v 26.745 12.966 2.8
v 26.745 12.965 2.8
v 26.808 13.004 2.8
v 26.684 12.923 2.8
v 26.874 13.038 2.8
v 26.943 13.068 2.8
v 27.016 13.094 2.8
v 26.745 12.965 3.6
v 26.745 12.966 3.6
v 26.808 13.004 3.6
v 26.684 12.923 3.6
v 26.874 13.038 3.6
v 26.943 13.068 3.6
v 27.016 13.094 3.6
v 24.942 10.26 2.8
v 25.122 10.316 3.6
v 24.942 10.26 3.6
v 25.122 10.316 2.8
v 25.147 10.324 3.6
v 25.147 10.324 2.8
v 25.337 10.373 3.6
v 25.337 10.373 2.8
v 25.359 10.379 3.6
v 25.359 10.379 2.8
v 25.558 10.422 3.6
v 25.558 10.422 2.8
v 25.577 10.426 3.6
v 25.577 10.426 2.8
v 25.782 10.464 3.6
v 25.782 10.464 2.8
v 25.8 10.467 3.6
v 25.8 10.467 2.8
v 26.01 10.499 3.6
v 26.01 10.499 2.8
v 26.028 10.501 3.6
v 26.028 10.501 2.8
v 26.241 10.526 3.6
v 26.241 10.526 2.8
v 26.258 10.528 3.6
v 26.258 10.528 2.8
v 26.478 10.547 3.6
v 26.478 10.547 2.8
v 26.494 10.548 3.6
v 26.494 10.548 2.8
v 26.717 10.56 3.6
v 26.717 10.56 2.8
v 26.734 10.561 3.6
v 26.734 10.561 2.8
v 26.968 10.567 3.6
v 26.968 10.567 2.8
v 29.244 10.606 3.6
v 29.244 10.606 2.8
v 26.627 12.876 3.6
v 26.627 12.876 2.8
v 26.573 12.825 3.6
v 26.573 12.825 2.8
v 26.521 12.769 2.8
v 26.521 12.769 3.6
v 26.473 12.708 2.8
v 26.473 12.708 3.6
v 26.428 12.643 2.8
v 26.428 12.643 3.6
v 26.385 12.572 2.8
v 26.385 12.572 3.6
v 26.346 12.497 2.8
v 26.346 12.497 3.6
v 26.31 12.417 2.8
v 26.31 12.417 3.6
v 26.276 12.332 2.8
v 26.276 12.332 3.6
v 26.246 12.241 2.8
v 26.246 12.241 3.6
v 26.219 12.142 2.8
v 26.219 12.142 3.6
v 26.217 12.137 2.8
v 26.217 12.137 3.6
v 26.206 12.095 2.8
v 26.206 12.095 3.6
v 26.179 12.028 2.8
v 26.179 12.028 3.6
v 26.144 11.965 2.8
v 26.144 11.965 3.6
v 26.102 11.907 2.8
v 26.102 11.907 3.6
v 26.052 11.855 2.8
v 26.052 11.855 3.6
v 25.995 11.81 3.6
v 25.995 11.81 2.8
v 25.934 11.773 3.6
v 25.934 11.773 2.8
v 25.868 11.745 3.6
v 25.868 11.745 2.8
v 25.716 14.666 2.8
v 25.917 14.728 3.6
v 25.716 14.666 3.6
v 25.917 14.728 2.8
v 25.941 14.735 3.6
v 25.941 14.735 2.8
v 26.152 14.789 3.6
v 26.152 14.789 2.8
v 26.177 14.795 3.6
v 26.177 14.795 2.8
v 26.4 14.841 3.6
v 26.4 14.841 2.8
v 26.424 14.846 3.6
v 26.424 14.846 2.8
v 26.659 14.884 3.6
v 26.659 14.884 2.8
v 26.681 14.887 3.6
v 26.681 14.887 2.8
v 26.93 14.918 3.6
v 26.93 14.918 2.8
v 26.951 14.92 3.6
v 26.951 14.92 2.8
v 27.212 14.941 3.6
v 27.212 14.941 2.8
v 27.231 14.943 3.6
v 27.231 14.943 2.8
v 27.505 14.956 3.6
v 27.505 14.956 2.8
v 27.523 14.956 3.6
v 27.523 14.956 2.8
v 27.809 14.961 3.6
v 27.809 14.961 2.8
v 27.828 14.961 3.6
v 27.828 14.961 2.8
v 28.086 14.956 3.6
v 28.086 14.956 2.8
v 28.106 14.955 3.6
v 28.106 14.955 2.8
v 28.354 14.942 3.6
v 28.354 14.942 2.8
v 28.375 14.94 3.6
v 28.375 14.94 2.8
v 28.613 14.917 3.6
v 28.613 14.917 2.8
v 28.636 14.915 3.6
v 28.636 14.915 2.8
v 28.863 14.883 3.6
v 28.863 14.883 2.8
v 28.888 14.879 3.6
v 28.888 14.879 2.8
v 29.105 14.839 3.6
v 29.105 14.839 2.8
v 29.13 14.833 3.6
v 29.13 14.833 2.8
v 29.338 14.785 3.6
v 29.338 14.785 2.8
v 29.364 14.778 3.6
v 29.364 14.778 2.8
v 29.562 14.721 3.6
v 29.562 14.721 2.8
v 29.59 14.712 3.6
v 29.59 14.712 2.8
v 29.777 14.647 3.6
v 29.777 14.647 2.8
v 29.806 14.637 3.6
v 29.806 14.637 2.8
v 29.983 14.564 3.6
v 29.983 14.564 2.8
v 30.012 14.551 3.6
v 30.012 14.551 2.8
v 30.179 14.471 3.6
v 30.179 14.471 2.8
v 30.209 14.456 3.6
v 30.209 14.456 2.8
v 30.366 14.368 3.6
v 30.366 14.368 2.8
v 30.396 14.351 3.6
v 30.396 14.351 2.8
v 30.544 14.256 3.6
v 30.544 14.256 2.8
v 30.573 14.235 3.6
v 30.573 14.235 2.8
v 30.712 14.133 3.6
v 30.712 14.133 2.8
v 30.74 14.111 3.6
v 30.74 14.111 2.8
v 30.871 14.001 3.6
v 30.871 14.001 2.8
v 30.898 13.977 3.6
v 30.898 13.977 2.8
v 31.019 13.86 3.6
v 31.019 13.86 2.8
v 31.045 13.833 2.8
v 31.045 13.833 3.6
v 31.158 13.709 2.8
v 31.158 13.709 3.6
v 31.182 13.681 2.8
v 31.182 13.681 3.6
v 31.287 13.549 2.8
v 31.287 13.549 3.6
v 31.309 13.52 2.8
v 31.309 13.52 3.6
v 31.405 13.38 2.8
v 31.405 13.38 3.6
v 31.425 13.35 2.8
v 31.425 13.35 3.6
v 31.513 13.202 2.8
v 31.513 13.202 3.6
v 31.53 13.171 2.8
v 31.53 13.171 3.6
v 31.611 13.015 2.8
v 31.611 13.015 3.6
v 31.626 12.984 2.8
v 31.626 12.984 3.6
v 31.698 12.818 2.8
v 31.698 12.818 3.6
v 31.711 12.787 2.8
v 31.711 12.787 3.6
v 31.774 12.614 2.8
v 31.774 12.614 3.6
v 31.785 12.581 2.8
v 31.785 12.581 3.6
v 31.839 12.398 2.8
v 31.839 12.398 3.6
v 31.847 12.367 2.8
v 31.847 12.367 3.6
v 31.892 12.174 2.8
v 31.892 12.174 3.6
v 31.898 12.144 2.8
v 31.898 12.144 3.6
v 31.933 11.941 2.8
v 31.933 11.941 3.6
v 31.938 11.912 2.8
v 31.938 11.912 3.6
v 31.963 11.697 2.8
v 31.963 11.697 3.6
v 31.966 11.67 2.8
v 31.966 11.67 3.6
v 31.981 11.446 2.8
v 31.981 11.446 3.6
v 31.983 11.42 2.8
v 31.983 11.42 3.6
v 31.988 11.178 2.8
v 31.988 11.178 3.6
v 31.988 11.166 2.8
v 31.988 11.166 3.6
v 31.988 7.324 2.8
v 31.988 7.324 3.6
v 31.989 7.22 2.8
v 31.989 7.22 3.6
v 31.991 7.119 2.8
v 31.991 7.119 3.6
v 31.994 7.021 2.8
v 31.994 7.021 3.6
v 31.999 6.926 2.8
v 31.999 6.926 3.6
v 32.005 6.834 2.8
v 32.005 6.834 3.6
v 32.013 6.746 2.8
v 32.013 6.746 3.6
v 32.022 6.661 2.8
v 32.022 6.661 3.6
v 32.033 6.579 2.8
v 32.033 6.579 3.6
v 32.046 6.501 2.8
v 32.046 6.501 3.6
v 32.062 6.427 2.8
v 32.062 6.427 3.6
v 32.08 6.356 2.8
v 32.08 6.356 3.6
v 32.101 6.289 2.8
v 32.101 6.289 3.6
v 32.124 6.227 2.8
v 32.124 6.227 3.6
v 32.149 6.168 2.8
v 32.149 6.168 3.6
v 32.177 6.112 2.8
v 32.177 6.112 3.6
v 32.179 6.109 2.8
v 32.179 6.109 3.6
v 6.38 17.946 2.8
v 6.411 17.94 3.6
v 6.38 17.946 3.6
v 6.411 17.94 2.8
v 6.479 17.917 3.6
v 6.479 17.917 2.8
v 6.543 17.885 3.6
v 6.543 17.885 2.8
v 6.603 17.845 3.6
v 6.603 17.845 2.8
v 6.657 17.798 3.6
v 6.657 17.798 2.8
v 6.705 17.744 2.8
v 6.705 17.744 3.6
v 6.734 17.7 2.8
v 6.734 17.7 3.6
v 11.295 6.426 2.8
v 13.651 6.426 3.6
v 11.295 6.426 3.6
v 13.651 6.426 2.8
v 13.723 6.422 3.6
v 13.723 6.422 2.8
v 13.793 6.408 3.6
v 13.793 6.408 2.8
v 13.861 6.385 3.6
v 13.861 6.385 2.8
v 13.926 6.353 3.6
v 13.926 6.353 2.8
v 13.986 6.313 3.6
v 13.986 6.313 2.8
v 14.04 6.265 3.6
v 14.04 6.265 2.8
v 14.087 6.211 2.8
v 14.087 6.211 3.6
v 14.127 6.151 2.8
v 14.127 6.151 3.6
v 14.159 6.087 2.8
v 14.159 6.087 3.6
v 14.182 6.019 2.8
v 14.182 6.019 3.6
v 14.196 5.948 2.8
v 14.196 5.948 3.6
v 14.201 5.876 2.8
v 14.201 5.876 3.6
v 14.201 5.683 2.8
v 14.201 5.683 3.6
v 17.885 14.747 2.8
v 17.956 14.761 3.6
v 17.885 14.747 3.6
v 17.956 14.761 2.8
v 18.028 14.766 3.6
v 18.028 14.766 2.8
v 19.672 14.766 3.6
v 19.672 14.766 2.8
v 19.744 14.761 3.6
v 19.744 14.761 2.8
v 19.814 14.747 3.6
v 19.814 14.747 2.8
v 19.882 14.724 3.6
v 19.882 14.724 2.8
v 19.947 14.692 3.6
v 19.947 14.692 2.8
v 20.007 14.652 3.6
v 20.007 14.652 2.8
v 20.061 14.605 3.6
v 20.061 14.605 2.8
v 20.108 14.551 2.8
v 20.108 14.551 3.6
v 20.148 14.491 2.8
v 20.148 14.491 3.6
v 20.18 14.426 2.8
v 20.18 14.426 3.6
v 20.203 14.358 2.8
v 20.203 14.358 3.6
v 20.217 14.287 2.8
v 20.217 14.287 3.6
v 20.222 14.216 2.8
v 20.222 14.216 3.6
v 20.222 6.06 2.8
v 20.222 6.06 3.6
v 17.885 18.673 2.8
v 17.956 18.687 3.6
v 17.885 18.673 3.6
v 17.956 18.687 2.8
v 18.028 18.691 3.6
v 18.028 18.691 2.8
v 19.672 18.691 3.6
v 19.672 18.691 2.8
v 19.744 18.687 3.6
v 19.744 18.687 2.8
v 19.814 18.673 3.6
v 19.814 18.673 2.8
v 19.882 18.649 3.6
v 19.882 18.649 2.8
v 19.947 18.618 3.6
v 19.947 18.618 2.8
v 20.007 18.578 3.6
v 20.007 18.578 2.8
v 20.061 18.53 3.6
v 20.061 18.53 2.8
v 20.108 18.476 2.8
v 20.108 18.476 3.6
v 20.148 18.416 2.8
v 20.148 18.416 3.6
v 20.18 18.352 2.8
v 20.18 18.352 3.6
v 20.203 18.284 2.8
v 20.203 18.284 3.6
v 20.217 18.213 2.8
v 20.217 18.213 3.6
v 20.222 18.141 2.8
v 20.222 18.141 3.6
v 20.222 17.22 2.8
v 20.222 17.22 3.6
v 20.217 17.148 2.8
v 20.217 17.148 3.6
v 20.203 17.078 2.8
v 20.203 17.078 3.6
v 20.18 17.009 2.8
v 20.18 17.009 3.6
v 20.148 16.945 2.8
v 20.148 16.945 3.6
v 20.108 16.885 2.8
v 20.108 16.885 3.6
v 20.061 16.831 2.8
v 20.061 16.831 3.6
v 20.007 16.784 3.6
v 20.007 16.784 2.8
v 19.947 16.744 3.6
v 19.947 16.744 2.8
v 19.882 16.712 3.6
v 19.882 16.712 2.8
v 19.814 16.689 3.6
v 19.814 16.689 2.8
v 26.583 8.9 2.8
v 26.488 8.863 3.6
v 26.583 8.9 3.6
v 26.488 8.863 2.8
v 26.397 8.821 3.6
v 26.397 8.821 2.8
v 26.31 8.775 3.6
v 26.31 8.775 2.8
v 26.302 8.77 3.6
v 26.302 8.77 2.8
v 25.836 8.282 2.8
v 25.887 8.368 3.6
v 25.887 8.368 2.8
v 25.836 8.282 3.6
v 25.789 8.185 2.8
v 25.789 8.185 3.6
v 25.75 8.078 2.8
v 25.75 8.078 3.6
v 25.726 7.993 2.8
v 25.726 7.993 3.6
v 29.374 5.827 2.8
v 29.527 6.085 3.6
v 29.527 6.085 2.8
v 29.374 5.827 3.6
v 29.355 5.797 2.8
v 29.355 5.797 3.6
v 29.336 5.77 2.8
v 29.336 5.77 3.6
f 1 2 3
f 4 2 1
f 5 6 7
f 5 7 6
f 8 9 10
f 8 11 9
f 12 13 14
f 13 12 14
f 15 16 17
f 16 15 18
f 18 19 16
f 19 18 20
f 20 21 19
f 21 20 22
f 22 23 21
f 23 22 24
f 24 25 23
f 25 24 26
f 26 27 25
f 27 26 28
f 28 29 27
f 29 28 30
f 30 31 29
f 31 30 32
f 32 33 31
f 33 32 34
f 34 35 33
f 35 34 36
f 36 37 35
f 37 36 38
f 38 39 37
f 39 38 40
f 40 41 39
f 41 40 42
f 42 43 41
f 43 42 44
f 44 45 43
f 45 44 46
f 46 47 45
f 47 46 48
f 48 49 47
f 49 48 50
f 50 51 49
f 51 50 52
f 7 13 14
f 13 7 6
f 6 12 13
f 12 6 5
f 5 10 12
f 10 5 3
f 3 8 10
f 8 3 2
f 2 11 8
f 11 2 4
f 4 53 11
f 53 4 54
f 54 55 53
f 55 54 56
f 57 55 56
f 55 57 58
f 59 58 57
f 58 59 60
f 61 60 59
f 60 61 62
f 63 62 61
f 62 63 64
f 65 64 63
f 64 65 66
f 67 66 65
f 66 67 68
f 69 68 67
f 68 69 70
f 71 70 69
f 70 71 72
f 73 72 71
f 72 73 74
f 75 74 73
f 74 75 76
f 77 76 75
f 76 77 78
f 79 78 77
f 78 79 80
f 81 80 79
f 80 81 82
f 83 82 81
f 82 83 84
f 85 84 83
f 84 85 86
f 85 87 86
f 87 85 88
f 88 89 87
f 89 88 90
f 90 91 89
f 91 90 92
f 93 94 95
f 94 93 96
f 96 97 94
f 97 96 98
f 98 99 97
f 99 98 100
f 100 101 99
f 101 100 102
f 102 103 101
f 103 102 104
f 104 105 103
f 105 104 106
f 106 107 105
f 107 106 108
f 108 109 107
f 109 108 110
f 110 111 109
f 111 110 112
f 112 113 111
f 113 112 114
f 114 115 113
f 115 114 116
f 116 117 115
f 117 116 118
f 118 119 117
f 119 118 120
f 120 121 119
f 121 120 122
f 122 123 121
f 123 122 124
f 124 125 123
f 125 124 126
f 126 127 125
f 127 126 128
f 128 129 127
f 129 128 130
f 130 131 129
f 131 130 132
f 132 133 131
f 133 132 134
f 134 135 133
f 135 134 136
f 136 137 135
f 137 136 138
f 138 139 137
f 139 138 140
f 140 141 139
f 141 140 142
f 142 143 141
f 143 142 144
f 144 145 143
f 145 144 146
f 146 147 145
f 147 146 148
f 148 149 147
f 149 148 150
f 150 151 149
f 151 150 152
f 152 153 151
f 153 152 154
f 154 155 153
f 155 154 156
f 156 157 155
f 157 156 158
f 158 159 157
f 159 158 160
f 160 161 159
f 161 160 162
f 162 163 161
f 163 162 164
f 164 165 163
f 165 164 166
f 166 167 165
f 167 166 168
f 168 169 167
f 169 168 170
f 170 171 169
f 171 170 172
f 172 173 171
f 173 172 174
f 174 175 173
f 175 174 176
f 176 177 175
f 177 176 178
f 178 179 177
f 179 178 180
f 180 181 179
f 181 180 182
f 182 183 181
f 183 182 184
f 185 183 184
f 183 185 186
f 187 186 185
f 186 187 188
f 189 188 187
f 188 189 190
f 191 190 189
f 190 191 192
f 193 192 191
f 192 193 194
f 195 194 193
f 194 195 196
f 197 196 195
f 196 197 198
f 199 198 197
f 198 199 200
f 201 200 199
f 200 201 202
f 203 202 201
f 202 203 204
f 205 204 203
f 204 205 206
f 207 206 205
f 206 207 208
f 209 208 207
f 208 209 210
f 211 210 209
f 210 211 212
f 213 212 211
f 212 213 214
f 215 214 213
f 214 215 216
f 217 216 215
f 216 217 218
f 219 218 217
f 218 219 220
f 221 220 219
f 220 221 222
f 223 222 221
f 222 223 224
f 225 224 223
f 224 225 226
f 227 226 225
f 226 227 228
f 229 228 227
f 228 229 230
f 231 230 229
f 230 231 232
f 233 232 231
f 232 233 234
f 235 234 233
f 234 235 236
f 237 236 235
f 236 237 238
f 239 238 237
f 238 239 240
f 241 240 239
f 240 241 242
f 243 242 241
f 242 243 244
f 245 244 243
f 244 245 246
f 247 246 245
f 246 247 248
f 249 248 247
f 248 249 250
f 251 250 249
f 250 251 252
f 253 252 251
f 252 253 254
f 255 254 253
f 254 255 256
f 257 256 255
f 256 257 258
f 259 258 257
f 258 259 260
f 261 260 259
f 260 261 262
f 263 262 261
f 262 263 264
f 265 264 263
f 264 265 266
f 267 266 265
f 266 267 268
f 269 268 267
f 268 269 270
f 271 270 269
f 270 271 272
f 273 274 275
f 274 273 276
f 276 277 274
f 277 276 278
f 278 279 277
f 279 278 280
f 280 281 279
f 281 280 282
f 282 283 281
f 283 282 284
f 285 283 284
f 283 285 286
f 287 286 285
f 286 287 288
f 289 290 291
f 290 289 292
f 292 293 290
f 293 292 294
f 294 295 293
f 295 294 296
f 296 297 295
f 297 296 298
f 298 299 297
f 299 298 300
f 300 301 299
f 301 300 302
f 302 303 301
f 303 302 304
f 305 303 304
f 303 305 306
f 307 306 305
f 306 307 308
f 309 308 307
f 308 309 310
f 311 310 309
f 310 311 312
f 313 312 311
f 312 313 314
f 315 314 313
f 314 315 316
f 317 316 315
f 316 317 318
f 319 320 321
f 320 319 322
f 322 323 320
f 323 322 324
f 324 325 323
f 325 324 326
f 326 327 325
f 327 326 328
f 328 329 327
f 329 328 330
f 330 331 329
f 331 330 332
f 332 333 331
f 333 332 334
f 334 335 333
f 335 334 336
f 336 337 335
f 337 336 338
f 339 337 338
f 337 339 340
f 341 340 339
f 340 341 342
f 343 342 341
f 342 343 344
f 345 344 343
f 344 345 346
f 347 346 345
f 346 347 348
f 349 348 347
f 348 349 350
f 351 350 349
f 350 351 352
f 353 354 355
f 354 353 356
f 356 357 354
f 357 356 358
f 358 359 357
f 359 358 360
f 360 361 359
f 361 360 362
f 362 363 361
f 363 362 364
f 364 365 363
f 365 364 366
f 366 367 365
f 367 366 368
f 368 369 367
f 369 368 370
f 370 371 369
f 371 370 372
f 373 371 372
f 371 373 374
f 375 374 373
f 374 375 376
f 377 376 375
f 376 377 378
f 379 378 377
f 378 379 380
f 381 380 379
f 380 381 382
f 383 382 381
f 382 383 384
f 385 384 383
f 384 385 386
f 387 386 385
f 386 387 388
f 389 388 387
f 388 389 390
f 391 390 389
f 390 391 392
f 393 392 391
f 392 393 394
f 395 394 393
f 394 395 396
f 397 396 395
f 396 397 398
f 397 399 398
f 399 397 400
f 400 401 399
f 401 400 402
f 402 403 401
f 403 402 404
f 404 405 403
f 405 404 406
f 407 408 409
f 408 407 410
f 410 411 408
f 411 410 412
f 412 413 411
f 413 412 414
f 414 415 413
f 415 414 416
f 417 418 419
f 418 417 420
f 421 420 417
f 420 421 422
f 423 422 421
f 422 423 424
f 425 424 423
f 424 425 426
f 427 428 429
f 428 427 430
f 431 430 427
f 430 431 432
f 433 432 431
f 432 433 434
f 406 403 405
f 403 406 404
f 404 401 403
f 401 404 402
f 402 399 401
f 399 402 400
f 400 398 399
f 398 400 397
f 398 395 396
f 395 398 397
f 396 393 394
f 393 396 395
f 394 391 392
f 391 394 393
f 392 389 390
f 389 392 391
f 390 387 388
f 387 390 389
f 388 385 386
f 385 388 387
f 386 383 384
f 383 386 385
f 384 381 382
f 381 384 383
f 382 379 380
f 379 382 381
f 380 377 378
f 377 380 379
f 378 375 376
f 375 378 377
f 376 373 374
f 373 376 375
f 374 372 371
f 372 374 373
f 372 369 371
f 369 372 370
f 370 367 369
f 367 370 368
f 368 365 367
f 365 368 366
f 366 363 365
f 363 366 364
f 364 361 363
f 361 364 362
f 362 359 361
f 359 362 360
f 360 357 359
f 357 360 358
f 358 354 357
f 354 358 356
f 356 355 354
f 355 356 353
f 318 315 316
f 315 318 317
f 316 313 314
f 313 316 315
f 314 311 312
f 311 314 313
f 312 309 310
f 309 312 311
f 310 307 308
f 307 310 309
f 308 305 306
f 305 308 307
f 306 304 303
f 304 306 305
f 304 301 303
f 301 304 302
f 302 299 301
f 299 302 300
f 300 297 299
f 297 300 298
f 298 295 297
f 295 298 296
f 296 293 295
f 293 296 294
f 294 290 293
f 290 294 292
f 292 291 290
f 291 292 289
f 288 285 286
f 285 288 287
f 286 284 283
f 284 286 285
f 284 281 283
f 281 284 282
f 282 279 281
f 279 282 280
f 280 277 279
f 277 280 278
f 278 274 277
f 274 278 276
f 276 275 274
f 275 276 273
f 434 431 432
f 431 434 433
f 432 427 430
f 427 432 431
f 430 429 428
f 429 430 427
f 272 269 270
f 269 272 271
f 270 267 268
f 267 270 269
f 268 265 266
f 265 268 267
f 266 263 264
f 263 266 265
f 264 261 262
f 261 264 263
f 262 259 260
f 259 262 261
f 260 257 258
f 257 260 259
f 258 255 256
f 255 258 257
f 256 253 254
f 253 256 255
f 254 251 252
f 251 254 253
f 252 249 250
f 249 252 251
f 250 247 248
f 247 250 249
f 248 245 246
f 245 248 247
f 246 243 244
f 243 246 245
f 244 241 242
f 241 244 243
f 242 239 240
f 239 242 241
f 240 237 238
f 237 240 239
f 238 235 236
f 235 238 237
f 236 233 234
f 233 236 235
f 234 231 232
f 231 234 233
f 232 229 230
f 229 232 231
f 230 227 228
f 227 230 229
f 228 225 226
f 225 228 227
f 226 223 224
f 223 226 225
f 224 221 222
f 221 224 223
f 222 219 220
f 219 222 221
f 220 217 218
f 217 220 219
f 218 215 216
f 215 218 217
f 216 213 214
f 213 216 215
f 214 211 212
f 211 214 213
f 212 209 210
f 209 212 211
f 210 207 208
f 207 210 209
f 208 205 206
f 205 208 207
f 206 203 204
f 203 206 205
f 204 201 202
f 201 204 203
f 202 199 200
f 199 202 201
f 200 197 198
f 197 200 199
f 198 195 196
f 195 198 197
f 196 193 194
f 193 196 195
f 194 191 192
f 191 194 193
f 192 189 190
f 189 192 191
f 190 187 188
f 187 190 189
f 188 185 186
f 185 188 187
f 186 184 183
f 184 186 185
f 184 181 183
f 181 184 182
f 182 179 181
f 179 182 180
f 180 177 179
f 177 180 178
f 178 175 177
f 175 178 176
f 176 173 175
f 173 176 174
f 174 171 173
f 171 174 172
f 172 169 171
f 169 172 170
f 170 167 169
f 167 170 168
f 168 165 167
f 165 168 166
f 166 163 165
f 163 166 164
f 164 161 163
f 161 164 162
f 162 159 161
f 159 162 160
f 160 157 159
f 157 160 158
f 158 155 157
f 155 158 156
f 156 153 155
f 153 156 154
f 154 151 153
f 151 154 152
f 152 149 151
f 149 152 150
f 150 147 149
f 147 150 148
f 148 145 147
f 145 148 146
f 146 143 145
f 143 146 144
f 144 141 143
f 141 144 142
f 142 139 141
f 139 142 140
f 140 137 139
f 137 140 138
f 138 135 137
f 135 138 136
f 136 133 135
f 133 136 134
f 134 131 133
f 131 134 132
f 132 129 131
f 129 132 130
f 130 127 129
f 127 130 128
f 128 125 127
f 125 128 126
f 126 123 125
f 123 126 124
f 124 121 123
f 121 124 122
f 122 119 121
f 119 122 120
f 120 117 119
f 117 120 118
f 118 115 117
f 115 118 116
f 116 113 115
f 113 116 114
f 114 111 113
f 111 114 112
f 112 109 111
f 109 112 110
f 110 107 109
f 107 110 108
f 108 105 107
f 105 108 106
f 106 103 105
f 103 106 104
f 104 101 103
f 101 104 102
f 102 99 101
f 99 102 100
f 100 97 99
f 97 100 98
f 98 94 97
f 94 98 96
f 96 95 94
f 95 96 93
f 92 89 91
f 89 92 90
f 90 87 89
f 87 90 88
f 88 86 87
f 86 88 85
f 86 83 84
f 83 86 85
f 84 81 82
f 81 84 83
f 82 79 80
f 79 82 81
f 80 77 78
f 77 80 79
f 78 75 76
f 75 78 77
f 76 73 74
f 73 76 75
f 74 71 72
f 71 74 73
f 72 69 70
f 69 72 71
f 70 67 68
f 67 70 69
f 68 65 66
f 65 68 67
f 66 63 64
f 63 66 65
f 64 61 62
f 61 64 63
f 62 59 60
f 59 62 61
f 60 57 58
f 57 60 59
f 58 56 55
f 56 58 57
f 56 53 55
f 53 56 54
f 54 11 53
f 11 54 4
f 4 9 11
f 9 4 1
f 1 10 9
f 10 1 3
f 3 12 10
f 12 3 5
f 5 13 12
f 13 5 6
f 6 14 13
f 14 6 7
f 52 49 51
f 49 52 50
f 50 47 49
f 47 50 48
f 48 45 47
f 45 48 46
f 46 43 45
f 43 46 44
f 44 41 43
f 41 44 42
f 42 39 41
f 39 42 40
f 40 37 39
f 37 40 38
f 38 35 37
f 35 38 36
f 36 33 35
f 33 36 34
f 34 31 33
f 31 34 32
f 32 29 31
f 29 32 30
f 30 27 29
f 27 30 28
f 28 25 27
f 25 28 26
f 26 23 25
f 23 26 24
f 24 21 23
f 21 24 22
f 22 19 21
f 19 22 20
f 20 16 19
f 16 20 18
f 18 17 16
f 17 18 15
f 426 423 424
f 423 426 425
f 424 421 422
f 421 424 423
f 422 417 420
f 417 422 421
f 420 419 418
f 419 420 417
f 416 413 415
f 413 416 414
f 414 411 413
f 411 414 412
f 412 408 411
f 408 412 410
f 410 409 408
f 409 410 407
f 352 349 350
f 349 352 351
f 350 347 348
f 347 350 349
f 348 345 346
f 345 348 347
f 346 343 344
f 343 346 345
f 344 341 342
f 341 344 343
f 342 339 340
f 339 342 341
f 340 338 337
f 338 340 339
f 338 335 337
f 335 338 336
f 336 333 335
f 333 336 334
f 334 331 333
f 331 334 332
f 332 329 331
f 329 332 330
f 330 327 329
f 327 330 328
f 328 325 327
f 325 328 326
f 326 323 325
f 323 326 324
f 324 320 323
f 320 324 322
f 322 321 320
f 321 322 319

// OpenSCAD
// file: keyring.scad
// =====================================================================================
//  HALLOWEEN GHOST KEYRING  -  ghost in a witch hat + your name       (OpenSCAD >= 2021.01)
//  Flat multi-colour keyring, stacked layers (all heights are multiples of 0.2 mm):
//     z 0.0-1.6  cream   : base + border + key-ring loop
//     z 1.6-2.8  black   : plate (under everything)     [loop: cream continues up to 2.8]
//     z 2.8-3.6  colours : ghost white, green name, gold star/buckle, purple band,
//                          black hat + eyes + mouth, pink cheeks + tongue
//  Every colour is its own part (own STL), all in the same coordinates:
//     openscad -D 'PART="green"' -o green.stl keyring.scad     PART = all | cream | black | white | green | gold | purple | pink
//  Change the name:  NAME = "Liam";   (long names: lower TEXT_SIZE or raise KEY_SCALE)
// =====================================================================================
NAME      = "Liam";
TEXT_SIZE = 14.4;           // cap height of the name in mm (design units, before KEY_SCALE)
TEXT_X    = 2.6;            // left edge of the name
KEY_SCALE = 0.9;            // overall size: 0.9 -> about 51 x 54 mm
HOLE_D    = 4.8;            // key-ring hole
PART      = "all";
$fn       = 48;

T_CREAM = 1.6;  T_BASE = 2.8;  T_TOP = 3.6;      // layer tops
EYELET  = [49.6, 35.4];                          // key-ring loop centre

// ------------------------------- 2-D building blocks (design units = mm / KEY_SCALE) ---------------
module ell(c, r, a = 0) { translate(c) rotate(a) scale([r[0], r[1]]) circle(1); }
module rrect(x0, y0, x1, y1, r) { hull() for (x = [x0 + r, x1 - r], y = [y0 + r, y1 - r]) translate([x, y]) circle(r); }

module plate2d() { rrect(0, 0, 50, 32, 7); }

// ---- witch hat: tilted brim + a cone that bends to the right
module brim2d() { ell([21.5, 33.2], [14.2, 3.1], 8); }
module cone2d() {
    hull() { ell([21.8, 34.2], [9.6, 1.8], 8); translate([25.2, 43]) circle(r = 4.6); }
    hull() { translate([25.2, 43]) circle(r = 4.6); translate([29.6, 50]) circle(r = 2.7); }
    hull() { translate([29.4, 50]) circle(r = 2.6); translate([35, 54.4]) circle(r = 1.4); }
}
module hat2d() { union() { brim2d(); cone2d(); } }
module band2d() { intersection() { cone2d(); translate([22.6, 38.6]) rotate(7) translate([-20, -2.1]) square([40, 4.2]); } }
module buckle2d() { translate([22.6, 38.6]) rotate(7) difference() { rrect(-3.5, -2.7, 3.5, 2.7, 0.9); rrect(-1.8, -1.2, 1.8, 1.2, 0.4); } }

// ---- ghost: round head, scalloped hem, a low left arm and a raised right arm
module ghost2d() {
    union() {
        translate([22, 24]) circle(r = 12.5);
        translate([9.5, 9.6]) square([25, 14.4]);
        for (x = [13.7, 22, 30.3]) translate([x, 9.8]) circle(r = 4.15);
        translate([8.8, 21.0]) circle(r = 3.9);
        ell([36.0, 22.4], [4.8, 3.1], 38);
    }
}
module eyes2d()   { for (x = [18.4, 25.6]) ell([x, 25.8], [1.25, 1.9]); }
module cheeks2d() { for (x = [15.0, 29.0]) ell([x, 21.5], [2.2, 1.35]); }
module mouth2d()  { translate([22, 22.7]) intersection() { circle(r = 2.7); translate([-3, -3]) square([6, 3]); } }
module tongue2d() { intersection() { mouth2d(); ell([22, 20.5], [1.7, 1.2]); } }

// ---- name (rounded, chunky) and star
module name2d() {
    translate([TEXT_X, 4.2]) offset(r = 0.55) offset(delta = -0.55)
        text(NAME, size = TEXT_SIZE, font = "Liberation Sans:style=Bold", halign = "left", spacing = 1.13);
}
module star2d() {
    translate([44.6, 22.4]) offset(r = 0.55) offset(delta = -0.55)
        polygon([for (i = [0 : 9]) let(a = 90 + i * 36, r = (i % 2 == 0) ? 4.6 : 2.05) [r * cos(a), r * sin(a)]]);
}

// ------------------------------- colour regions (each already clipped by what lies in front of it) ---------------
module black_base2d() { union() { plate2d(); hat2d(); offset(delta = 1.0) ghost2d(); offset(delta = 0.8) star2d(); } }
module cream2d()      { union() { offset(r = 2.0) black_base2d(); translate(EYELET) circle(r = 5.3); } }

module hat_black2d()  { difference() { hat2d(); band2d(); buckle2d(); } }
module band_purple2d(){ difference() { band2d(); buckle2d(); } }
module white2d()      { difference() { ghost2d(); hat2d(); name2d(); star2d(); eyes2d(); cheeks2d(); mouth2d(); } }
module gold2d()       { union() { star2d(); buckle2d(); } }
module black_top2d()  { union() { hat_black2d(); eyes2d(); difference() { mouth2d(); tongue2d(); } } }
module pink2d()       { union() { cheeks2d(); tongue2d(); } }

module slab(z0, z1) { translate([0, 0, z0]) linear_extrude(height = z1 - z0, convexity = 8) children(); }

module cream() {
    difference() {
        union() { slab(0, T_CREAM) cream2d(); slab(T_CREAM, T_BASE) difference() { translate(EYELET) circle(r = 5.3); } }
        translate(EYELET) translate([0, 0, -1]) cylinder(d = HOLE_D, h = 10);
    }
}
module black() { union() { slab(T_CREAM, T_BASE) black_base2d(); slab(T_BASE, T_TOP) black_top2d(); } }
module white()  { slab(T_BASE, T_TOP) white2d(); }
module green()  { slab(T_BASE, T_TOP) name2d(); }
module gold()   { slab(T_BASE, T_TOP) gold2d(); }
module purple() { slab(T_BASE, T_TOP) band_purple2d(); }
module pink()   { slab(T_BASE, T_TOP) pink2d(); }

// single-colour version: the top-layer regions are merged in 2-D first, so touching colours become ONE clean solid
module top_union2d() { union() { black_top2d(); white2d(); name2d(); gold2d(); band_purple2d(); pink2d(); } }
module onecolor()    { union() { cream(); slab(T_CREAM, T_BASE) black_base2d(); slab(T_BASE, T_TOP) top_union2d(); } }

module part() {
    if (PART == "all") { cream(); black(); white(); green(); gold(); purple(); pink(); }
    else if (PART == "onecolor") onecolor();
    else if (PART == "cream") cream(); else if (PART == "black") black(); else if (PART == "white") white();
    else if (PART == "green") green(); else if (PART == "gold") gold(); else if (PART == "purple") purple(); else if (PART == "pink") pink();
}
scale([KEY_SCALE, KEY_SCALE, 1]) part();
// main file
// Overlap test: every pair of colour parts must share (almost) zero volume.   openscad -D 'A="white"' -D 'B="green"' ...
include <keyring.scad>;
PART = "none"; A = "white"; B = "green";
module p(n) { if (n == "cream") cream(); else if (n == "black") black(); else if (n == "white") white(); else if (n == "green") green();
              else if (n == "gold") gold(); else if (n == "purple") purple(); else if (n == "pink") pink(); }
intersection() { p(A); p(B); }
